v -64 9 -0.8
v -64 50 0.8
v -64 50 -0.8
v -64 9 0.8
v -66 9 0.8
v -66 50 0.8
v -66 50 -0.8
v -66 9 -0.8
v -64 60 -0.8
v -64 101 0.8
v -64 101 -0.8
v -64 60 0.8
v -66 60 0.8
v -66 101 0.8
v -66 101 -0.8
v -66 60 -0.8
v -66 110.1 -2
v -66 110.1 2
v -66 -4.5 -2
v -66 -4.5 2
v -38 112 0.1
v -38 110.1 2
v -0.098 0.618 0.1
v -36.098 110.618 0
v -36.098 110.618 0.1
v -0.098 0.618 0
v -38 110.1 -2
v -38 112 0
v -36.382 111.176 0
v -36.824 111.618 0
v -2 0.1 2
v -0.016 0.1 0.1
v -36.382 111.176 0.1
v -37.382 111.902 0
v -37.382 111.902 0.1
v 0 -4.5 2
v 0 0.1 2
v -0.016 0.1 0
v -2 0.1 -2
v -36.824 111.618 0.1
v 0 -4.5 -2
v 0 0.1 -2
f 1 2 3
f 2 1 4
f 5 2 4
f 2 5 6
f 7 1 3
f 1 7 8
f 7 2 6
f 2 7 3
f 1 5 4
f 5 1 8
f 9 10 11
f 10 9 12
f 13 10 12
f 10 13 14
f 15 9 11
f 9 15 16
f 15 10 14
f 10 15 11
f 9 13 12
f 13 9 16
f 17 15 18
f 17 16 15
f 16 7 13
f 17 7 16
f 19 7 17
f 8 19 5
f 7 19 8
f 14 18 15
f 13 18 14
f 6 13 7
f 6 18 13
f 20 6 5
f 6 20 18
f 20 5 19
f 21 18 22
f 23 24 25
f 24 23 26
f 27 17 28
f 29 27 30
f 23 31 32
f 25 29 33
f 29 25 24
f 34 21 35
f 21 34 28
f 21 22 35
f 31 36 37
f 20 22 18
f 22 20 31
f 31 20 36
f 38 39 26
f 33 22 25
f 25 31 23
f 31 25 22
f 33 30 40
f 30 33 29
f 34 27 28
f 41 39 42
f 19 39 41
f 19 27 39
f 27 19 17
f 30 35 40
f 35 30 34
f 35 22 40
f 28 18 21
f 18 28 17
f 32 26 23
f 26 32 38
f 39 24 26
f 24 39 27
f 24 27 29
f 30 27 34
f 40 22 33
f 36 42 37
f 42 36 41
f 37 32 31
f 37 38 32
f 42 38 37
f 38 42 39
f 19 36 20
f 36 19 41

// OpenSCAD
// file: design_params.scad
// ============================================================
// STARLING SHARED DESIGN PARAMETERS — single source of truth for
// every dimension two parts must agree on.
//
// Consumers:
//   - every part in cad/ does        include <design_params.scad>
//   - parts in cad/calibration/ do   include <../design_params.scad>
//   - scripts/check_params.py FAILS the build if any of these names
//     is re-declared anywhere else — change values HERE only.
//
// Keep this file to simple `name = value;` lines so the tooling can
// parse it. One-off experiments: `openscad -D name=value` beats the
// include, no need to edit this file.
// ============================================================

// --- The paper tube (bought part, consumable) ---
tube_od     = 52.95;   // measured tube OD — verify with cad/calibration/tube_fit_ring.scad
tube_wall   = 3;       // paper wall thickness (measure your tube)
tube_length = 540;

// --- Printed-part fits ---
sleeve_clearance = 0;  // added to every sleeve bore diameter; tune via the fit ring
fit_tol          = 0.2; // clearance for printed slots/pockets
sleeve_wall      = 3;  // wall thickness of printed sleeves

// --- Wing spar chain (rib holes = adapter sockets = carbon rods) ---
spar_rod_d    = 6;     // carbon rod diameter
spar_hole_d   = 6.2;   // printed hole for that rod
spar_spacing  = 20;    // chordwise distance between the two spars
spar_y_offset = 1.5;   // spar line sits this far above the rib chord line

// --- Wing geometry ---
rib_chord     = 100;
naca_code     = 2415;  // cambered lifting section
rib_thickness = 2;

// --- Wing adapter <-> root rib interface ---
wing_tab_thickness = 11; // adapter tab (socket carrier; ribs sit outboard of it)
wing_tab_span      = 15; // how far the tab reaches out from the sleeve
adapter_length     = 40; // sleeve length = tab chord extent

// --- Stations along the tube (assembly; wing slides for CG trim) ---
wing_station       = 300; // wing adapter position, measured from the motor face
tail_tube_stop     = 54;  // tube bottoms out here inside the tail sleeve (rim top)
nose_sleeve_length = 20;  // how far the nose cone slides over the tube

// --- Servos (9 g / SG90 class) ---
servo_body   = [23, 12.2]; // [length, width]
servo_flange = [32, 12.2];
servo_height = 22;         // body height incl. shaft boss, without horn

// --- Control system (internal servos, wire pushrods through wall slots) ---
ctrl_chord       = 22;   // control-surface chord (elevator / rudder / aileron)
ctrl_thickness   = 4;    // control-surface root thickness = fin thickness
hinge_groove_w   = 1.6;  // groove for the hinge strip/tape, both fin TE and surface LE
hinge_groove_d   = 2.5;
pushrod_d        = 1.2;  // piano-wire pushrod, attached at the TIP of both arms
pushrod_slot_w   = 2.5;  // wall slot the pushrod moves in
pushrod_slot_len = 18;   // slot channel length along the rod (see throw_check.py)
servo_horn_r     = 10;   // full arm length — the wire connects at the far end
servo_travel_deg = 45;   // used one-sided travel; the arm can do ~±90 (180 total)
                         // but the linkage stays near-linear only within ±45
ctrl_horn_r      = 10;   // control-surface horn = servo horn -> 1:1 linkage

// Tail linkage geometry. Three 22 mm-wide servos cannot share one height
// inside the Ø53 bore (corner collisions), so they are STAGGERED in Z:
// the two elevator servos sit HIGH (opposite sides, they coexist), the
// rudder servo sits LOW. Each wire attaches at the arm tip and exits
// through an angled wall slot raked toward its surface horn.
tail_servo_z           = 33; // bottom (shaft end) of the ELEVATOR servo bodies
tail_slot_angle        = 42; // elevator rod angle off the fuselage axis
tail_rudder_z          = 9;  // bottom (shaft end) of the RUDDER servo body
tail_rudder_slot_angle = 56; // rudder rod angle off the fuselage axis

// --- Motor (22xx class, rear pusher) ---
motor_shaft_hole_d = 10;
motor_screw_hole_d = 4;
motor_pattern_x    = 16;  // screw pattern
motor_pattern_y    = 19;
// main file
// HORIZONTAL TAIL FIN — print TWO (left and right are the same symmetric
// part), FLAT on the bed: no supports, and the layer lines run along the
// span, which is the strong direction. The root tab glues into the tail
// sleeve's fin socket; the TE groove takes the elevator hinge strip.
// Geometry lives in tail.scad.

use <tail.scad>

$fn = 60;
fin_horizontal_part();
